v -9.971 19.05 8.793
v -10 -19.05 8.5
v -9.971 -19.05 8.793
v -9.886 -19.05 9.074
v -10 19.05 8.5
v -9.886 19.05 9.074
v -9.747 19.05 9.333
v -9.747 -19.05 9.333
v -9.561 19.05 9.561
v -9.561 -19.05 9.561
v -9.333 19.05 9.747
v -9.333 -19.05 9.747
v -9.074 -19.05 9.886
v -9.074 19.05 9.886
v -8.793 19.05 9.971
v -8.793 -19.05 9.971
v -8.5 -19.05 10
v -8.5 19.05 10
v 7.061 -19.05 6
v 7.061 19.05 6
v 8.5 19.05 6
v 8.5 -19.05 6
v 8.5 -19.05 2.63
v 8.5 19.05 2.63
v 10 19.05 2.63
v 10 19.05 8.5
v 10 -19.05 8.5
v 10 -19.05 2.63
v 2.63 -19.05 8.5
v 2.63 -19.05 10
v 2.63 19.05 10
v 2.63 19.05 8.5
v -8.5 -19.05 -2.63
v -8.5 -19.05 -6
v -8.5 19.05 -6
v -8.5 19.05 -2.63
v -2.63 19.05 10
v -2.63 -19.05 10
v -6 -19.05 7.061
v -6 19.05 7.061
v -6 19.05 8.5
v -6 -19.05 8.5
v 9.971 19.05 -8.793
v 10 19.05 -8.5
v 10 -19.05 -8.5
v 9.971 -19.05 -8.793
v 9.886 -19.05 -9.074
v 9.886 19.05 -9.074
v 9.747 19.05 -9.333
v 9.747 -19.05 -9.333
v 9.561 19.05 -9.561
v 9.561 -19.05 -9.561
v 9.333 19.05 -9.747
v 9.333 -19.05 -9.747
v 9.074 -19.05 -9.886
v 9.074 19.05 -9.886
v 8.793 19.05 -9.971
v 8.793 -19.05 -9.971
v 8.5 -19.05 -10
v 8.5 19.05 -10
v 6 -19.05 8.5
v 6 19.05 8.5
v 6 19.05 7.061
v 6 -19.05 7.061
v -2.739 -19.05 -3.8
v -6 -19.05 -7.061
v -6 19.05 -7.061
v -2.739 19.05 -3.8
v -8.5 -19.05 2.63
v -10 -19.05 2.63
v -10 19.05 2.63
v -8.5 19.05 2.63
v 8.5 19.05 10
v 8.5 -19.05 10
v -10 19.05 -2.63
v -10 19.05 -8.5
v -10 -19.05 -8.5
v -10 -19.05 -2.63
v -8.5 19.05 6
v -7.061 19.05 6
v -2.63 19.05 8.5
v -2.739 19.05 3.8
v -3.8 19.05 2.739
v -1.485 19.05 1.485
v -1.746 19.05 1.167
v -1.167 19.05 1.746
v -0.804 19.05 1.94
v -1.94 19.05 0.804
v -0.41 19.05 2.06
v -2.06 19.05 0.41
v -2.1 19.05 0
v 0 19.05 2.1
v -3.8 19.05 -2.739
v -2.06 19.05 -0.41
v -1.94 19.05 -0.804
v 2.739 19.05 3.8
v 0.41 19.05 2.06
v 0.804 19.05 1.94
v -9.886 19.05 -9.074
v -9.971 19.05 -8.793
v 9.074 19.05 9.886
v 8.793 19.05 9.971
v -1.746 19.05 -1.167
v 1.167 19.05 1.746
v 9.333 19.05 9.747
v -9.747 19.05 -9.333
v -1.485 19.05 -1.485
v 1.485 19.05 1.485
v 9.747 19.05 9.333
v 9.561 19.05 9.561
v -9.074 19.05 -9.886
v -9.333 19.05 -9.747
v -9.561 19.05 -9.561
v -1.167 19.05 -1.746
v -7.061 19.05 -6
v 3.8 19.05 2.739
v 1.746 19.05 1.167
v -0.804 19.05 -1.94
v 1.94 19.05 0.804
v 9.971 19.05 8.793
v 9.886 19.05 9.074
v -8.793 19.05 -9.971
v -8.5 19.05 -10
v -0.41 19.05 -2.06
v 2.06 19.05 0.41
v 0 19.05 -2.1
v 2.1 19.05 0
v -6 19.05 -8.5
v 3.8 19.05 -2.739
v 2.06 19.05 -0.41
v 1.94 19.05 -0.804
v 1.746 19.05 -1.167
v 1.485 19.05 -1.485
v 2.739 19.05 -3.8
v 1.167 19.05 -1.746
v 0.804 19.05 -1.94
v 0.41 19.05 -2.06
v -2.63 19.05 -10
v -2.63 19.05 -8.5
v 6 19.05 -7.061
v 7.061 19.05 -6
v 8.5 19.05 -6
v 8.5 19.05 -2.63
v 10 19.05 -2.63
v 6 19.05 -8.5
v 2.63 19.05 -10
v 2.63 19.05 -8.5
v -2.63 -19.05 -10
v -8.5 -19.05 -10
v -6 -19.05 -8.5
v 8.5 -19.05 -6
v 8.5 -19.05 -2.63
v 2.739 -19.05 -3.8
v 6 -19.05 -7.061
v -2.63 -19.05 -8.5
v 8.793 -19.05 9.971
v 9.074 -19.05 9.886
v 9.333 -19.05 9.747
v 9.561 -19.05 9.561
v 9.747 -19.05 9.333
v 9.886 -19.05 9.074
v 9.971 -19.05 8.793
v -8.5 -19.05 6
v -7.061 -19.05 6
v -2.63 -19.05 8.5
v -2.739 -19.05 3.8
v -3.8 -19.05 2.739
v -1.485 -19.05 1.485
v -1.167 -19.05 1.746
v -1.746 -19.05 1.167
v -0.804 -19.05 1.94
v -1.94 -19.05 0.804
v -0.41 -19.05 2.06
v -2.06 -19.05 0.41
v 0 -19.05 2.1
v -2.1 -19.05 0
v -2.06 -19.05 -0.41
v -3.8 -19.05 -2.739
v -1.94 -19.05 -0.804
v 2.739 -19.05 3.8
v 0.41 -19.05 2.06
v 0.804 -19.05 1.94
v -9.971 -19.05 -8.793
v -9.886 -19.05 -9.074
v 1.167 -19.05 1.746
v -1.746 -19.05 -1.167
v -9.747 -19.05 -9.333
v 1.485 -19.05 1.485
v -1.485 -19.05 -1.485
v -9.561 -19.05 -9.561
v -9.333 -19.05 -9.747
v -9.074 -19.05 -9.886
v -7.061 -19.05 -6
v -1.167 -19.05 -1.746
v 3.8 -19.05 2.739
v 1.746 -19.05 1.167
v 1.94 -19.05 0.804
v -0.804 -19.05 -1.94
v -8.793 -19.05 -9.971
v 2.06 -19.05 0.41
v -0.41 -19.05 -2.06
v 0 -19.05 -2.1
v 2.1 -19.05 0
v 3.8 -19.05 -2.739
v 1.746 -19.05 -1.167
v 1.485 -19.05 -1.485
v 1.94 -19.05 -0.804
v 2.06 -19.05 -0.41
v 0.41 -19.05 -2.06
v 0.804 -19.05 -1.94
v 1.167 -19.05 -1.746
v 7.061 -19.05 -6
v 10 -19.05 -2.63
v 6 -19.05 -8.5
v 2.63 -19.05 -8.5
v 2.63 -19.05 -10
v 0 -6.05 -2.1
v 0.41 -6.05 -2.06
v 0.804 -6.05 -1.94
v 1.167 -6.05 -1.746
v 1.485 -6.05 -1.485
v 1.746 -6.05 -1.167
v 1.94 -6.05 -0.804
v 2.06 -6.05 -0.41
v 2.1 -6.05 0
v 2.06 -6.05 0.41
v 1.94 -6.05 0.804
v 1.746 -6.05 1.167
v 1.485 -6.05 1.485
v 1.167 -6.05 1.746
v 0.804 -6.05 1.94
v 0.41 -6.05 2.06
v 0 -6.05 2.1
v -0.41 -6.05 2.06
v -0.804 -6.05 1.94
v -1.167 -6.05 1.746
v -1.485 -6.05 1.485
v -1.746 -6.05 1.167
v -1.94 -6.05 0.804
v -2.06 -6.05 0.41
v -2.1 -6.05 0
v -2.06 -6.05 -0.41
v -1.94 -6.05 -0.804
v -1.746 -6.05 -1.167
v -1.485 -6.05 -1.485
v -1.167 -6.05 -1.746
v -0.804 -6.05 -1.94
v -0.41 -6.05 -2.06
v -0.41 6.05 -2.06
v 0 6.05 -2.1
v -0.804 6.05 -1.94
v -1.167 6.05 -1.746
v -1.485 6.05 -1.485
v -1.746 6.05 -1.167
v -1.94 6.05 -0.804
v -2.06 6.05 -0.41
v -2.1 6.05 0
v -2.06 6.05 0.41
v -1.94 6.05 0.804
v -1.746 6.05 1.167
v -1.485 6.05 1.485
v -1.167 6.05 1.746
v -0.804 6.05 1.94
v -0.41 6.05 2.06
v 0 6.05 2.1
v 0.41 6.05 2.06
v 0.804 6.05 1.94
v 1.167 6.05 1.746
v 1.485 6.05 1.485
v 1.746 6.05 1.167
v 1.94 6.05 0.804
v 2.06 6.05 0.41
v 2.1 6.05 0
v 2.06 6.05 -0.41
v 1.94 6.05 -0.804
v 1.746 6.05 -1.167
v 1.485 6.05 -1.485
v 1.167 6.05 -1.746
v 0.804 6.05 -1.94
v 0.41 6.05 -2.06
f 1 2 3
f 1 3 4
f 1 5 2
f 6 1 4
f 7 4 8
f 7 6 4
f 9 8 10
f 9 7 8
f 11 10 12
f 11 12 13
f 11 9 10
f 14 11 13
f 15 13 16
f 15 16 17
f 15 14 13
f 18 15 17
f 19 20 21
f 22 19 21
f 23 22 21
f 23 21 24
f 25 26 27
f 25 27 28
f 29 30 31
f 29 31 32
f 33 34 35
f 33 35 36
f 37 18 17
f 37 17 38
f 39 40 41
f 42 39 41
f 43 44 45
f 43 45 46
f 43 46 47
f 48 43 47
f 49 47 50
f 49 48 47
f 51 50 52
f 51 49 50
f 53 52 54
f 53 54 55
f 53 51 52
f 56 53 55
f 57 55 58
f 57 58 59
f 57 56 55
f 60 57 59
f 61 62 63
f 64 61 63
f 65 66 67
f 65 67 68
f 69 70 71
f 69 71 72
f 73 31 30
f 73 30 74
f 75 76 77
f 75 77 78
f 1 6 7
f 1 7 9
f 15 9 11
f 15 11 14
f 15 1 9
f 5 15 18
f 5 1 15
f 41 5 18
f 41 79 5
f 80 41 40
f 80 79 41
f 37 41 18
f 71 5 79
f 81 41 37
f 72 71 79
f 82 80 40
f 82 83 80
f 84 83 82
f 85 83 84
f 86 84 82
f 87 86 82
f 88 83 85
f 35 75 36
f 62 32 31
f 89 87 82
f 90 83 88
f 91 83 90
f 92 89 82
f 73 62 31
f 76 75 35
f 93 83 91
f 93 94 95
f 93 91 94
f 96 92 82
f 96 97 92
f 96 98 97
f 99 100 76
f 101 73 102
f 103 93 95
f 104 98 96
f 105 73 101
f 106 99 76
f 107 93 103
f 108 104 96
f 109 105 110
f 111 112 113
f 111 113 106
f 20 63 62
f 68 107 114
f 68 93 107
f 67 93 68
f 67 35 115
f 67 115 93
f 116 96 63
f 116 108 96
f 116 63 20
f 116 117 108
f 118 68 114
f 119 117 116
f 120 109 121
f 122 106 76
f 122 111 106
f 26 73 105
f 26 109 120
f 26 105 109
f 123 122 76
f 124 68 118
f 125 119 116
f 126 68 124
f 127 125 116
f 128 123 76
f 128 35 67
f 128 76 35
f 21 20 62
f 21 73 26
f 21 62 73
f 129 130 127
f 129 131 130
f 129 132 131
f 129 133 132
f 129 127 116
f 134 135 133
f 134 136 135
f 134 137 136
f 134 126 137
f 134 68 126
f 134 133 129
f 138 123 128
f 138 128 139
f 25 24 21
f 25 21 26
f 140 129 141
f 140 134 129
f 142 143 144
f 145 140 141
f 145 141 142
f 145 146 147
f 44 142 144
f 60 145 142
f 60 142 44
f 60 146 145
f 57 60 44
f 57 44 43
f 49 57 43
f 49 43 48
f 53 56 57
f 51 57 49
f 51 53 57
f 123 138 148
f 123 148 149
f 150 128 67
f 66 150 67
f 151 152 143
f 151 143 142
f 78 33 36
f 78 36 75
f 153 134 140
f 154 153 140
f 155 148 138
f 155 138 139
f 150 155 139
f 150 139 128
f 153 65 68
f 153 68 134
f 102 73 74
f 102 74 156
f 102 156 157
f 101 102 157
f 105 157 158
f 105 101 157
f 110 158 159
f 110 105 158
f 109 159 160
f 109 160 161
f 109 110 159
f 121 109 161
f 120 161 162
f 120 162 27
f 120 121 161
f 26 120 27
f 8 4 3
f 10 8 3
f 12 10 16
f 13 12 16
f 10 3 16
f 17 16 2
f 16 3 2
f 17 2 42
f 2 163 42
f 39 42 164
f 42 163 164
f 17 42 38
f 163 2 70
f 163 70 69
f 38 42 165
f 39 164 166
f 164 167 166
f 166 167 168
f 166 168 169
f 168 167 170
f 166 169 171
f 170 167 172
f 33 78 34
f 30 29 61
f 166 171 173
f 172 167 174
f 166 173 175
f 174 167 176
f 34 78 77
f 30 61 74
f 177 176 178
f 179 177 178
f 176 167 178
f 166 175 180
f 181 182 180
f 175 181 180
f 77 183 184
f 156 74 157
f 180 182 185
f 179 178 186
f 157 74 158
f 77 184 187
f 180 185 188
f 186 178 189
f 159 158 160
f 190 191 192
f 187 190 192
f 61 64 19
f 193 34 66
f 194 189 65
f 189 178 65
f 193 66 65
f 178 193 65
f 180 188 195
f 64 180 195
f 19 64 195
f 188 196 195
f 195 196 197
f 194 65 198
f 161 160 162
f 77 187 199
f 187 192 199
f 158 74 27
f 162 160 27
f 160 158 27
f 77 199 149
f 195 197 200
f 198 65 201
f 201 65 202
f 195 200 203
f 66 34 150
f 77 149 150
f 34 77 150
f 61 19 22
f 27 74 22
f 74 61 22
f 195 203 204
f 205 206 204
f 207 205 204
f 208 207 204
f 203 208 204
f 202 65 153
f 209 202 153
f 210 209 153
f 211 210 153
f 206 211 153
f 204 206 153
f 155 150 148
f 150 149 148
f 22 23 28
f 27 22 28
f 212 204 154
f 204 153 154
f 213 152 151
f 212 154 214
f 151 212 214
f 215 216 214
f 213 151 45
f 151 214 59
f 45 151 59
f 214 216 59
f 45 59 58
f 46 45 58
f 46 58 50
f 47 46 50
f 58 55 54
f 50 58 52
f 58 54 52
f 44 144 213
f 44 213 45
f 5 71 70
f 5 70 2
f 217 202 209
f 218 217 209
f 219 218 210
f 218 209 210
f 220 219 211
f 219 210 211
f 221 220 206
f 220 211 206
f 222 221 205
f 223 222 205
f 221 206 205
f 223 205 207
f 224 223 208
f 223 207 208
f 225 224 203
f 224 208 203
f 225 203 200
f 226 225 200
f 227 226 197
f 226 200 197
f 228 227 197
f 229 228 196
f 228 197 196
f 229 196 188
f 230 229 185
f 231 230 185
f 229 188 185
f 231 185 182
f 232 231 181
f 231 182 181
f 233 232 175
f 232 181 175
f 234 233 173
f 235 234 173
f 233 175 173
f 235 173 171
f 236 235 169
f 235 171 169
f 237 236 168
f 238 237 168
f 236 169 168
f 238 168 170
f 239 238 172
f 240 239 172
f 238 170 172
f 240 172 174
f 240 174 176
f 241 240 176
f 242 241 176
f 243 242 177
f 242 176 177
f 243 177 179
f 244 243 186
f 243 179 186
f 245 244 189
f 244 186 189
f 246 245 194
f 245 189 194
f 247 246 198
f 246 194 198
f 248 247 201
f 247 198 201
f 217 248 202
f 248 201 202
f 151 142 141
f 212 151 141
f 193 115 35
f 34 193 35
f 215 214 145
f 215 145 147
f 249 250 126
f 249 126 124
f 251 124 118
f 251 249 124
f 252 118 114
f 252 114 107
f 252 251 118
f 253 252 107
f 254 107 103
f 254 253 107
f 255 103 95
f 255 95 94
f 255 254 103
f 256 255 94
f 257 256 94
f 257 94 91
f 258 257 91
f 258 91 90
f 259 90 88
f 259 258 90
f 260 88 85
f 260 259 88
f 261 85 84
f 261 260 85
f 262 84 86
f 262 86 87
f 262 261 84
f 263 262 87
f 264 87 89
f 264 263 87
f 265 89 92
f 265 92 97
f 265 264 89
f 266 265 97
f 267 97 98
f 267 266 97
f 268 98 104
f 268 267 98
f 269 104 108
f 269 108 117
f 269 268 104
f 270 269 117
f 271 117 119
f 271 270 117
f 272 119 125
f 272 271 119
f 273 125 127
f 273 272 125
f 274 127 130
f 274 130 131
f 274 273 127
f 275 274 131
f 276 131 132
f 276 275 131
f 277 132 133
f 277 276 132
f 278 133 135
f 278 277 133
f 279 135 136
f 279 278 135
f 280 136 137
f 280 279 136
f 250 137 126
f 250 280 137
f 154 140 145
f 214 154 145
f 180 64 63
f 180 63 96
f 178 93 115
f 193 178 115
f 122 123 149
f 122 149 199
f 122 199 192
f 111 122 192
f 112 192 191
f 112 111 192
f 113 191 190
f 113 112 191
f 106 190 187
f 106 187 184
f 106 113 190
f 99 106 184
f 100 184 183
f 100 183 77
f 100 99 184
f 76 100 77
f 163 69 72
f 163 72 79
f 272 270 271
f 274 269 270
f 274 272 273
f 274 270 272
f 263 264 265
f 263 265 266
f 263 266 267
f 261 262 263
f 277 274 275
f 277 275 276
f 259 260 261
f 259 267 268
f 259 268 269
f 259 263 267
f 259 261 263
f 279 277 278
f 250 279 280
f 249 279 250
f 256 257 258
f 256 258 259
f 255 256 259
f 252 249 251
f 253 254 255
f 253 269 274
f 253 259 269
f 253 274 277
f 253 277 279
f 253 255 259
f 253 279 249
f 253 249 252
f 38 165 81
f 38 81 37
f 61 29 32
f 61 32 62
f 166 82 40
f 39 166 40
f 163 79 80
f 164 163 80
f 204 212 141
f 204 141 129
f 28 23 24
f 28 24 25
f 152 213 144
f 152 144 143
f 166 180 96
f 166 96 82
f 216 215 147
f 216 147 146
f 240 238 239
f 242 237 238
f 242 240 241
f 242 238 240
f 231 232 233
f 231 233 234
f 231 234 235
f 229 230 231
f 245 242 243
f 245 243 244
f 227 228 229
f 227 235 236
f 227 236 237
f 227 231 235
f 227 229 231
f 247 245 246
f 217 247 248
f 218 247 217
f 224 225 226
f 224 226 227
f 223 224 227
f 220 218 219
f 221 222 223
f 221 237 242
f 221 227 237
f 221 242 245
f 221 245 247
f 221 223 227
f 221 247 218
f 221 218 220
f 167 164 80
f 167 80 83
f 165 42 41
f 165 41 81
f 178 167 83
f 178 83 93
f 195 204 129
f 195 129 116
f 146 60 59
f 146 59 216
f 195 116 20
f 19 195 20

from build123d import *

# Parameters (mm, degrees)
BOSS_EXTRUDE1_DEPTH     = 19.05
CUT_EXTRUDE5_DEPTH      = 24.725566379
CUT_EXTRUDE5_DEPTH_BACK = 24.725566379
SKETCH5_R               = 2.1
CUT_EXTRUDE6_DEPTH      = 13
CUT_EXTRUDE7_START      = -13
SKETCH4_R               = 2.1
CUT_EXTRUDE7_DEPTH      = 13


with BuildPart() as part:
    # Sketch1 → Boss-Extrude1 (new, symmetric)
    with BuildSketch(Plane(origin=(0, 0, 0), x_dir=(1, 0, 0), z_dir=(0, 1, 0))):
        with BuildLine():
            Line((-8.5, -10), (8.5, -10))
            ThreePointArc((8.5, -10), (9.560660172, -9.560660172), (10, -8.5))
            Line((10, -8.5), (10, 8.5))
            ThreePointArc((10, 8.5), (9.560660172, 9.560660172), (8.5, 10))
            Line((8.5, 10), (-8.5, 10))
            ThreePointArc((-8.5, 10), (-9.560660172, 9.560660172), (-10, 8.5))
            Line((-10, 8.5), (-10, -8.5))
            ThreePointArc((-10, -8.5), (-9.560660172, -9.560660172), (-8.5, -10))
        make_face()
    extrude(amount=BOSS_EXTRUDE1_DEPTH, both=True)

    # Sketch3 → Cut-Extrude5 (cut, two sides: drawn at the far end of the back side and taken through both)
    with BuildSketch(Plane(origin=(0, 0, 0), x_dir=(1, 0, 0), z_dir=(0, 1, 0)).offset(-CUT_EXTRUDE5_DEPTH_BACK)):
        Polygon((2.63, 10), (-2.63, 10), (-2.63, 8.5), (-6, 8.5), (-6, 7.060660172), (-2.739339828, 3.8), (2.739339828, 3.8), (6, 7.060660172), (6, 8.5), (2.63, 8.5), align=None)
        Polygon((10, -2.63), (10, 2.63), (8.5, 2.63), (8.5, 6), (7.060660172, 6), (3.8, 2.739339828), (3.8, -2.739339828), (7.060660172, -6), (8.5, -6), (8.5, -2.63), align=None)
        Polygon((-2.63, -10), (2.63, -10), (2.63, -8.5), (6, -8.5), (6, -7.060660172), (2.739339828, -3.8), (-2.739339828, -3.8), (-6, -7.060660172), (-6, -8.5), (-2.63, -8.5), align=None)
        Polygon((-10, 2.63), (-10, -2.63), (-8.5, -2.63), (-8.5, -6), (-7.060660172, -6), (-3.8, -2.739339828), (-3.8, 2.739339828), (-7.060660172, 6), (-8.5, 6), (-8.5, 2.63), align=None)
    extrude(amount=CUT_EXTRUDE5_DEPTH + CUT_EXTRUDE5_DEPTH_BACK, mode=Mode.SUBTRACT)

    # Sketch5 → Cut-Extrude6 (cut)
    with BuildSketch(Plane.XZ.offset(19.05)):
        with Locations(Location((0, 0, 0), (0, 0, 270))):
            Circle(SKETCH5_R)
    extrude(amount=-CUT_EXTRUDE6_DEPTH, mode=Mode.SUBTRACT)

    # Sketch4 → Cut-Extrude7 (cut)
    with BuildSketch(Plane(origin=(0, 19.05, 0), x_dir=(1, 0, 0), z_dir=(0, 1, 0)).offset(CUT_EXTRUDE7_START)):
        with Locations(Location((0, 0, 0), (0, 0, 90))):
            Circle(SKETCH4_R)
    extrude(amount=CUT_EXTRUDE7_DEPTH, mode=Mode.SUBTRACT)


solid = part.part
